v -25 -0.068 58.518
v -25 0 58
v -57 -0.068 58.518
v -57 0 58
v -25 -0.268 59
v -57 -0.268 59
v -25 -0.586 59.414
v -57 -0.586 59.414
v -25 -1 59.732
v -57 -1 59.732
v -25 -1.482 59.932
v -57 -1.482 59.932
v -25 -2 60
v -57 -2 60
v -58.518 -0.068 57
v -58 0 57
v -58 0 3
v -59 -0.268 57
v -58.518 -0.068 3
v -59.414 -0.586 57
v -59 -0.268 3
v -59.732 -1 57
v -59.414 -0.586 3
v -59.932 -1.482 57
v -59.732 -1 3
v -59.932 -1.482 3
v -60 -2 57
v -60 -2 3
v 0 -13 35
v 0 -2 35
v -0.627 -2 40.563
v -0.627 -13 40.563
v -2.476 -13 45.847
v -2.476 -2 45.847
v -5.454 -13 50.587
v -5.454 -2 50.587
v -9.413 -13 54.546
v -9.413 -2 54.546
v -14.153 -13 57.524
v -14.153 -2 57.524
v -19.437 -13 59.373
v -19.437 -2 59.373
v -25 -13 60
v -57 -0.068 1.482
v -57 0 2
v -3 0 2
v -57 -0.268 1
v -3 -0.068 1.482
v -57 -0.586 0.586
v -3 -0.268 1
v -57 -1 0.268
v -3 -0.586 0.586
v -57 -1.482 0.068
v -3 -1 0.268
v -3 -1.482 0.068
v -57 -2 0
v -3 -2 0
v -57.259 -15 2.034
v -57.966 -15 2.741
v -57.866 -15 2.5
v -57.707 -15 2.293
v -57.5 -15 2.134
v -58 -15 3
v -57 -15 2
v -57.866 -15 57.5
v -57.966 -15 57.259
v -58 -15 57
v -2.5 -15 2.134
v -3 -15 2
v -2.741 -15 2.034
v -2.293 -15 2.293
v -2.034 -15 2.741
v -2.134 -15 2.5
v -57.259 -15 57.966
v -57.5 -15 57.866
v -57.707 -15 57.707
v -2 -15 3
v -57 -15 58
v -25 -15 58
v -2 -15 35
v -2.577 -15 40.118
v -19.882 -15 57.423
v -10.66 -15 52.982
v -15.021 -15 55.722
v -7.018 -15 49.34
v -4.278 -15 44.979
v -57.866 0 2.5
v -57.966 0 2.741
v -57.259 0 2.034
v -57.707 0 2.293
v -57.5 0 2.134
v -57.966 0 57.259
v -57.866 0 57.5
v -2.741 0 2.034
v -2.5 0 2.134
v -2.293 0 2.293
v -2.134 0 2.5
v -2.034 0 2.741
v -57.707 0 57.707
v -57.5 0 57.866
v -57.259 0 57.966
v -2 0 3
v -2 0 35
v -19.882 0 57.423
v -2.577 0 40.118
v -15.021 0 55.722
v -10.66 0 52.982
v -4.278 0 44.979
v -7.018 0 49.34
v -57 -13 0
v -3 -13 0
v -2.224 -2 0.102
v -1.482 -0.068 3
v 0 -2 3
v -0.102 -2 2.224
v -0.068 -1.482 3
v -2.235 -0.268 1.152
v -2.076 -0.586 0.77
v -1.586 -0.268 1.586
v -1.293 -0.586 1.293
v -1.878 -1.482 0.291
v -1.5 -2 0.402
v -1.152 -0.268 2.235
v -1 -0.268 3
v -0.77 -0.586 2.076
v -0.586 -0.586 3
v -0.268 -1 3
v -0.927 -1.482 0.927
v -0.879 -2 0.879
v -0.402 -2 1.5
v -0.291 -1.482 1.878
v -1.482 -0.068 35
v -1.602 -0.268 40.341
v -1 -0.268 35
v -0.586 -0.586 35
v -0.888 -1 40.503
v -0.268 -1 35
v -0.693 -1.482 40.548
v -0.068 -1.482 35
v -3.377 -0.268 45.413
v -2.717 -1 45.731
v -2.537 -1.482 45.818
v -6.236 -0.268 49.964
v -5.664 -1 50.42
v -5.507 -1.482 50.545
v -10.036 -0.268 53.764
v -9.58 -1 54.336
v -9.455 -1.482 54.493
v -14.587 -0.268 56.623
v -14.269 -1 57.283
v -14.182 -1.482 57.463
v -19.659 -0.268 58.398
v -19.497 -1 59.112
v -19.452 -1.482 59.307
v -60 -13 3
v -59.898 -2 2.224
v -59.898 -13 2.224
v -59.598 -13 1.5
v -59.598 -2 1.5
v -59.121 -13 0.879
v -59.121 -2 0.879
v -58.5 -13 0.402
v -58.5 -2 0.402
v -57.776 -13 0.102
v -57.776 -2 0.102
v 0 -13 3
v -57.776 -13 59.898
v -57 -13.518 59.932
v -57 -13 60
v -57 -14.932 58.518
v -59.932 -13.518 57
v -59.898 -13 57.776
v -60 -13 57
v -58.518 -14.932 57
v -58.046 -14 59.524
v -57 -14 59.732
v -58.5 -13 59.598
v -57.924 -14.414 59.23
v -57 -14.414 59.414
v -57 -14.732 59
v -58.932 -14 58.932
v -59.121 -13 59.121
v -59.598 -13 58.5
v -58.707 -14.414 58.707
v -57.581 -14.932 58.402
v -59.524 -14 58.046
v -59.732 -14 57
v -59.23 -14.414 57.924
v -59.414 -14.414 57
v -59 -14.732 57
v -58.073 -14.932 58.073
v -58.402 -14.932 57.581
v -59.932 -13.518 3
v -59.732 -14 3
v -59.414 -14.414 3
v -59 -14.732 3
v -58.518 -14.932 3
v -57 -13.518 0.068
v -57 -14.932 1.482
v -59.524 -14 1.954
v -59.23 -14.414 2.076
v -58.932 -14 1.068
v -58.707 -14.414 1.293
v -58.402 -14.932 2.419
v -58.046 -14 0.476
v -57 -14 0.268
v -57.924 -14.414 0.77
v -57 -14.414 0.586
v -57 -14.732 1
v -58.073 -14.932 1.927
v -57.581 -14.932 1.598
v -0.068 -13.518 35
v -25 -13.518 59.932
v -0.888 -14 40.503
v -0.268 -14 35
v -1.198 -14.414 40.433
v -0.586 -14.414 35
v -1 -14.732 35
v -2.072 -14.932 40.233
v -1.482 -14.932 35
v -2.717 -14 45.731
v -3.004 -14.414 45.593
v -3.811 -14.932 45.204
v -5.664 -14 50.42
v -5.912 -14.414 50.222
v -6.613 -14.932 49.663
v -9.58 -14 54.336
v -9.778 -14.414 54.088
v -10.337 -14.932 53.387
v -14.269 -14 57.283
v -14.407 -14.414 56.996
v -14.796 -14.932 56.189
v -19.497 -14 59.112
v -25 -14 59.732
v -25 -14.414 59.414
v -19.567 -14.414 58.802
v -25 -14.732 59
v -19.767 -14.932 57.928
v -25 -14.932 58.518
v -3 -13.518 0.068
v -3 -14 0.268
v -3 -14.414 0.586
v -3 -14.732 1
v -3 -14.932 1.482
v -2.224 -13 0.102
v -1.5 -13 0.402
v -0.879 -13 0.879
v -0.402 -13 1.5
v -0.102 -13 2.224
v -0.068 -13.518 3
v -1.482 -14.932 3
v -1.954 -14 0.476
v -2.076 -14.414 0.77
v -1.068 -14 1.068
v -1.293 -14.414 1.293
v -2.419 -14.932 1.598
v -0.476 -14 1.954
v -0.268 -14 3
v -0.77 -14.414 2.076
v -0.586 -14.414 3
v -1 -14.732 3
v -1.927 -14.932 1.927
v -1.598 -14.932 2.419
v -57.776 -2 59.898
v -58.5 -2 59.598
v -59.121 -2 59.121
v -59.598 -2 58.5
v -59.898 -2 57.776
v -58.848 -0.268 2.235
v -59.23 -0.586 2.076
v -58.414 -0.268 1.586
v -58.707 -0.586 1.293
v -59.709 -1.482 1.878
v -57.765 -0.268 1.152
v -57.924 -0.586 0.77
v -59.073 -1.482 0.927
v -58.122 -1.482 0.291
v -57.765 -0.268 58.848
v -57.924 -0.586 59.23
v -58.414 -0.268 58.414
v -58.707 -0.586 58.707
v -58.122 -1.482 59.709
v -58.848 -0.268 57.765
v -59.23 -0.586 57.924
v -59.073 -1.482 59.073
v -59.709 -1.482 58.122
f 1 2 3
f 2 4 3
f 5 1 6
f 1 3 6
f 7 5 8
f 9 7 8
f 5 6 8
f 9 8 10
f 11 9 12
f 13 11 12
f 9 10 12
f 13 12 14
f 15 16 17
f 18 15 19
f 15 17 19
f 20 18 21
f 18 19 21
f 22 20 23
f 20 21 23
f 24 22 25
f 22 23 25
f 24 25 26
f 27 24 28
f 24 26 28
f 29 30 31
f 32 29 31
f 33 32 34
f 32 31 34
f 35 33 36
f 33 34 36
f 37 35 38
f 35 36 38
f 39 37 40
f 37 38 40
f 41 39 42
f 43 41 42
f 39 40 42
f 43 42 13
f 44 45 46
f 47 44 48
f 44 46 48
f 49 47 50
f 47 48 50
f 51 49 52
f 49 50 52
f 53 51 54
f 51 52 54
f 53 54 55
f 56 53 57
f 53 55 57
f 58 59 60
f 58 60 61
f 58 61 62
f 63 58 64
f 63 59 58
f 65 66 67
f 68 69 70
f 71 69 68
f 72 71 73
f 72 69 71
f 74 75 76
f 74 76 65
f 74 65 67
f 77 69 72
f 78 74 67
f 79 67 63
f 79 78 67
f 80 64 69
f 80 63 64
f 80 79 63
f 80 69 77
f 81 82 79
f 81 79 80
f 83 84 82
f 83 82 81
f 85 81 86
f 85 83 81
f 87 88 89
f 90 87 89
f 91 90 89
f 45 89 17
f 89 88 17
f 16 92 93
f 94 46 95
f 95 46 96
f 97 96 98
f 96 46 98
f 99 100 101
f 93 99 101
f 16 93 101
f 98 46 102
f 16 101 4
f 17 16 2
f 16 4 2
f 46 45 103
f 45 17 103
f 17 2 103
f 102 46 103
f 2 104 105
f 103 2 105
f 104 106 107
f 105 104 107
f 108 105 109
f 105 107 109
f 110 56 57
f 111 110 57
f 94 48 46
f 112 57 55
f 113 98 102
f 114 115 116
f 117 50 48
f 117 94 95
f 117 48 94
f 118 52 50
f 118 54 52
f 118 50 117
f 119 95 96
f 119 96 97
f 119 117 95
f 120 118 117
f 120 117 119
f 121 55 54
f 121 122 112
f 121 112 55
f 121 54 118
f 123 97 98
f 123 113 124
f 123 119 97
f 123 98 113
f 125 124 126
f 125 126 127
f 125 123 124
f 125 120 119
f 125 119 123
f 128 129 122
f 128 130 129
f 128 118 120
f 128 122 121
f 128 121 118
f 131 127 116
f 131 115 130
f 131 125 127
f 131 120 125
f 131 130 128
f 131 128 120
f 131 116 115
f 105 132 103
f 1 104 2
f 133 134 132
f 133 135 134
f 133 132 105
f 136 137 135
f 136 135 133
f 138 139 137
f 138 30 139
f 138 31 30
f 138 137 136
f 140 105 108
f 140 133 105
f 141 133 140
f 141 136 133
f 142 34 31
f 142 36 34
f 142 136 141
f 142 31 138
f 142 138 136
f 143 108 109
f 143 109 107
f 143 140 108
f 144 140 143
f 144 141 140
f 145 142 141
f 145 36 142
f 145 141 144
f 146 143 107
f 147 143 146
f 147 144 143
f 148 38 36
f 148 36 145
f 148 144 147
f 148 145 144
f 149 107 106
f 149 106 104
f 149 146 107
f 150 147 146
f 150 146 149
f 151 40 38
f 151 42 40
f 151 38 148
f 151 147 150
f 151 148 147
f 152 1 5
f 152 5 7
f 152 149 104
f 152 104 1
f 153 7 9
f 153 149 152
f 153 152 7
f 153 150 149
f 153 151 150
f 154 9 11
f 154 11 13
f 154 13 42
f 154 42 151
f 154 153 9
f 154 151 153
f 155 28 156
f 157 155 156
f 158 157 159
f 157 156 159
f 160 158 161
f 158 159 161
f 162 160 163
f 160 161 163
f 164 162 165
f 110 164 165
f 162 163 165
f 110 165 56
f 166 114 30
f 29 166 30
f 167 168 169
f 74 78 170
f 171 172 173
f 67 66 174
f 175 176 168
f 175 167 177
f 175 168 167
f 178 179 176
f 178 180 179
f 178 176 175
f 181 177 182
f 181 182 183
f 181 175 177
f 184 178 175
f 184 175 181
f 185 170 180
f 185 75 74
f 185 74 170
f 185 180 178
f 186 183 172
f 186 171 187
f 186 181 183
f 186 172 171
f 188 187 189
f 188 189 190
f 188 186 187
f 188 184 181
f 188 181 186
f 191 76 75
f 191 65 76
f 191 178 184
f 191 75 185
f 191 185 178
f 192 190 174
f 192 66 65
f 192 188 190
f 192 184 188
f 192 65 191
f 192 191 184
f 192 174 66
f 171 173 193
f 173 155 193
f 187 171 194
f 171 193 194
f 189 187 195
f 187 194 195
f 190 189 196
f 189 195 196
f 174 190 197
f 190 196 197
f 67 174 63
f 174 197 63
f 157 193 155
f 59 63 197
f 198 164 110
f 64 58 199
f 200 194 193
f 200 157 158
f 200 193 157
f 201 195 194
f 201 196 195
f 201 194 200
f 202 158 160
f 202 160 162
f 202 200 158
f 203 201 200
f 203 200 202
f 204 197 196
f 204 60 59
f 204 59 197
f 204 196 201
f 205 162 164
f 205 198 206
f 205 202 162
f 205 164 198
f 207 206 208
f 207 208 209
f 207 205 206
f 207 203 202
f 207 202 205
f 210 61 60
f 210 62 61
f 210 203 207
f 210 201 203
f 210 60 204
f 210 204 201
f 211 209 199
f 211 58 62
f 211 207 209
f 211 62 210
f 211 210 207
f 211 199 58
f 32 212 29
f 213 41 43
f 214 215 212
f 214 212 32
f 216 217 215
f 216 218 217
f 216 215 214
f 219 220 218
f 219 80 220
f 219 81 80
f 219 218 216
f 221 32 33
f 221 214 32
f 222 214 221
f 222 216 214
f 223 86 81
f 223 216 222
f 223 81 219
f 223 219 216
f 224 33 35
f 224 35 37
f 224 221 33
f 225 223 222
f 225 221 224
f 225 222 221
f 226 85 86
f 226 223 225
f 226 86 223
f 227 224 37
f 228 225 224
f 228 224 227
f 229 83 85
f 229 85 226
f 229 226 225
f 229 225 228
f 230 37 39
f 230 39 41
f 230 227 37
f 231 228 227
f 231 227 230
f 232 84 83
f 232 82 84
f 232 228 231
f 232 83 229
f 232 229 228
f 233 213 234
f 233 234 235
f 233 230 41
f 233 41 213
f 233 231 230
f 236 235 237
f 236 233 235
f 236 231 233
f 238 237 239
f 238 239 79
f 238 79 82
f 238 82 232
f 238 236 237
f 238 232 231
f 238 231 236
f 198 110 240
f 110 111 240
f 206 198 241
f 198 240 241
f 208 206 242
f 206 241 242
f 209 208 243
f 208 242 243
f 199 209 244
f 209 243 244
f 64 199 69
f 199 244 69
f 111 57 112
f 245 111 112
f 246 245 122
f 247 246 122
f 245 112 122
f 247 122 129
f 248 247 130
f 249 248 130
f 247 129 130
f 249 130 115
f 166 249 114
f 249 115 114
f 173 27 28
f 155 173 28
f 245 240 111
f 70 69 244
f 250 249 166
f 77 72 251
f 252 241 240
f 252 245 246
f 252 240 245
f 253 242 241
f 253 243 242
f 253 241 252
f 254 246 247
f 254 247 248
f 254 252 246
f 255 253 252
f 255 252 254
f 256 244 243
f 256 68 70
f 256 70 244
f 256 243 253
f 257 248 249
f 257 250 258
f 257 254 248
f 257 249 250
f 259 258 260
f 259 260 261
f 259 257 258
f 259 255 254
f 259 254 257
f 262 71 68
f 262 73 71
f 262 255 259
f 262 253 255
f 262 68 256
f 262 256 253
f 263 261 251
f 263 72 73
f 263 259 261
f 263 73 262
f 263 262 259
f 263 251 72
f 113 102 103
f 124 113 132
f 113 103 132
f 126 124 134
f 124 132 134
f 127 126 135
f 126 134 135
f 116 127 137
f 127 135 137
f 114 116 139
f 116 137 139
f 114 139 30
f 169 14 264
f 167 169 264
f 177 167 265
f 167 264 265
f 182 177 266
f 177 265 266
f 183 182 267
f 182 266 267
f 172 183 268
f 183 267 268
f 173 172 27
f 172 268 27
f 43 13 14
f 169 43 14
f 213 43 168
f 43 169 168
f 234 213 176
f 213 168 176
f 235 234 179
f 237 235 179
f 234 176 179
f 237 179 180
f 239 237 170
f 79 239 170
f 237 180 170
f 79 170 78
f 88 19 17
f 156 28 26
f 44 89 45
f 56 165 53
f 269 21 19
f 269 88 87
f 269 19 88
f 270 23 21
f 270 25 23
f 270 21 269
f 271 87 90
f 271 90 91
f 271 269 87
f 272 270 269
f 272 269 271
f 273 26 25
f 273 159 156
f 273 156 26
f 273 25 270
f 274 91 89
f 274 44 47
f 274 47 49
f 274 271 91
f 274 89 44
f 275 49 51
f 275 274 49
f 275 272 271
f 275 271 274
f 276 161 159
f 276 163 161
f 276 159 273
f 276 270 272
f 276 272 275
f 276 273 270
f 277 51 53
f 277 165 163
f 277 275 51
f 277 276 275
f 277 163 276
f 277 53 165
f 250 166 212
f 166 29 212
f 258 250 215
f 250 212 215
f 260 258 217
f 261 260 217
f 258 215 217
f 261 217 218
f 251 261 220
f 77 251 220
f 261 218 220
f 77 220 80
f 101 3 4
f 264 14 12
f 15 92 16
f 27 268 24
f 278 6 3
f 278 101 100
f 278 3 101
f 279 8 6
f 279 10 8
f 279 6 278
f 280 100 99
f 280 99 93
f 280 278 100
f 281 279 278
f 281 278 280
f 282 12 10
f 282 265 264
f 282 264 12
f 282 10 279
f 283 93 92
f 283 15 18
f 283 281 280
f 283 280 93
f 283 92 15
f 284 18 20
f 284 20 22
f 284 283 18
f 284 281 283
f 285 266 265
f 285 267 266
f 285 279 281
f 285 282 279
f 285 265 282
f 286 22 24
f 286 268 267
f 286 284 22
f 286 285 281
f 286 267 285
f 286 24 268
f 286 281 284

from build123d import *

# Parameters (mm, degrees)
F1_DEPTH = 15
F2_R     = 2
F3_R     = 2


with BuildPart() as f1:
    # F0 (on Front) → F1 (new body)
    with BuildSketch(Plane.XZ):
        with BuildLine():
            Line((-57, 0), (-3, 0))
            ThreePointArc((-3, 0), (-0.87868, 0.87868), (0, 3))
            Line((0, 3), (0, 35))
            ThreePointArc((0, 35), (-7.32233, 52.67767), (-25, 60))
            Line((-25, 60), (-57, 60))
            ThreePointArc((-57, 60), (-59.12132, 59.12132), (-60, 57))
            Line((-60, 57), (-60, 3))
            ThreePointArc((-60, 3), (-59.12132, 0.87868), (-57, 0))
        make_face()
    extrude(amount=F1_DEPTH)

    # F2
    f2_edges = [f1.edges().sort_by_distance(p)[0] for p in [
        (-30, -15, 0),
        (-0.87868, -15, 0.87868),
        (0, -15, 19),
        (-7.32233, -15, 52.67767),
        (-41, -15, 60),
        (-59.12132, -15, 59.12132),
        (-60, -15, 30),
        (-59.12132, -15, 0.87868),
    ]]
    fillet(f2_edges, radius=F2_R)

    # F3
    f3_edges = [f1.edges().sort_by_distance(p)[0] for p in [
        (-41, 0, 60),
    ]]
    fillet(f3_edges, radius=F3_R)


solid = f1.part
